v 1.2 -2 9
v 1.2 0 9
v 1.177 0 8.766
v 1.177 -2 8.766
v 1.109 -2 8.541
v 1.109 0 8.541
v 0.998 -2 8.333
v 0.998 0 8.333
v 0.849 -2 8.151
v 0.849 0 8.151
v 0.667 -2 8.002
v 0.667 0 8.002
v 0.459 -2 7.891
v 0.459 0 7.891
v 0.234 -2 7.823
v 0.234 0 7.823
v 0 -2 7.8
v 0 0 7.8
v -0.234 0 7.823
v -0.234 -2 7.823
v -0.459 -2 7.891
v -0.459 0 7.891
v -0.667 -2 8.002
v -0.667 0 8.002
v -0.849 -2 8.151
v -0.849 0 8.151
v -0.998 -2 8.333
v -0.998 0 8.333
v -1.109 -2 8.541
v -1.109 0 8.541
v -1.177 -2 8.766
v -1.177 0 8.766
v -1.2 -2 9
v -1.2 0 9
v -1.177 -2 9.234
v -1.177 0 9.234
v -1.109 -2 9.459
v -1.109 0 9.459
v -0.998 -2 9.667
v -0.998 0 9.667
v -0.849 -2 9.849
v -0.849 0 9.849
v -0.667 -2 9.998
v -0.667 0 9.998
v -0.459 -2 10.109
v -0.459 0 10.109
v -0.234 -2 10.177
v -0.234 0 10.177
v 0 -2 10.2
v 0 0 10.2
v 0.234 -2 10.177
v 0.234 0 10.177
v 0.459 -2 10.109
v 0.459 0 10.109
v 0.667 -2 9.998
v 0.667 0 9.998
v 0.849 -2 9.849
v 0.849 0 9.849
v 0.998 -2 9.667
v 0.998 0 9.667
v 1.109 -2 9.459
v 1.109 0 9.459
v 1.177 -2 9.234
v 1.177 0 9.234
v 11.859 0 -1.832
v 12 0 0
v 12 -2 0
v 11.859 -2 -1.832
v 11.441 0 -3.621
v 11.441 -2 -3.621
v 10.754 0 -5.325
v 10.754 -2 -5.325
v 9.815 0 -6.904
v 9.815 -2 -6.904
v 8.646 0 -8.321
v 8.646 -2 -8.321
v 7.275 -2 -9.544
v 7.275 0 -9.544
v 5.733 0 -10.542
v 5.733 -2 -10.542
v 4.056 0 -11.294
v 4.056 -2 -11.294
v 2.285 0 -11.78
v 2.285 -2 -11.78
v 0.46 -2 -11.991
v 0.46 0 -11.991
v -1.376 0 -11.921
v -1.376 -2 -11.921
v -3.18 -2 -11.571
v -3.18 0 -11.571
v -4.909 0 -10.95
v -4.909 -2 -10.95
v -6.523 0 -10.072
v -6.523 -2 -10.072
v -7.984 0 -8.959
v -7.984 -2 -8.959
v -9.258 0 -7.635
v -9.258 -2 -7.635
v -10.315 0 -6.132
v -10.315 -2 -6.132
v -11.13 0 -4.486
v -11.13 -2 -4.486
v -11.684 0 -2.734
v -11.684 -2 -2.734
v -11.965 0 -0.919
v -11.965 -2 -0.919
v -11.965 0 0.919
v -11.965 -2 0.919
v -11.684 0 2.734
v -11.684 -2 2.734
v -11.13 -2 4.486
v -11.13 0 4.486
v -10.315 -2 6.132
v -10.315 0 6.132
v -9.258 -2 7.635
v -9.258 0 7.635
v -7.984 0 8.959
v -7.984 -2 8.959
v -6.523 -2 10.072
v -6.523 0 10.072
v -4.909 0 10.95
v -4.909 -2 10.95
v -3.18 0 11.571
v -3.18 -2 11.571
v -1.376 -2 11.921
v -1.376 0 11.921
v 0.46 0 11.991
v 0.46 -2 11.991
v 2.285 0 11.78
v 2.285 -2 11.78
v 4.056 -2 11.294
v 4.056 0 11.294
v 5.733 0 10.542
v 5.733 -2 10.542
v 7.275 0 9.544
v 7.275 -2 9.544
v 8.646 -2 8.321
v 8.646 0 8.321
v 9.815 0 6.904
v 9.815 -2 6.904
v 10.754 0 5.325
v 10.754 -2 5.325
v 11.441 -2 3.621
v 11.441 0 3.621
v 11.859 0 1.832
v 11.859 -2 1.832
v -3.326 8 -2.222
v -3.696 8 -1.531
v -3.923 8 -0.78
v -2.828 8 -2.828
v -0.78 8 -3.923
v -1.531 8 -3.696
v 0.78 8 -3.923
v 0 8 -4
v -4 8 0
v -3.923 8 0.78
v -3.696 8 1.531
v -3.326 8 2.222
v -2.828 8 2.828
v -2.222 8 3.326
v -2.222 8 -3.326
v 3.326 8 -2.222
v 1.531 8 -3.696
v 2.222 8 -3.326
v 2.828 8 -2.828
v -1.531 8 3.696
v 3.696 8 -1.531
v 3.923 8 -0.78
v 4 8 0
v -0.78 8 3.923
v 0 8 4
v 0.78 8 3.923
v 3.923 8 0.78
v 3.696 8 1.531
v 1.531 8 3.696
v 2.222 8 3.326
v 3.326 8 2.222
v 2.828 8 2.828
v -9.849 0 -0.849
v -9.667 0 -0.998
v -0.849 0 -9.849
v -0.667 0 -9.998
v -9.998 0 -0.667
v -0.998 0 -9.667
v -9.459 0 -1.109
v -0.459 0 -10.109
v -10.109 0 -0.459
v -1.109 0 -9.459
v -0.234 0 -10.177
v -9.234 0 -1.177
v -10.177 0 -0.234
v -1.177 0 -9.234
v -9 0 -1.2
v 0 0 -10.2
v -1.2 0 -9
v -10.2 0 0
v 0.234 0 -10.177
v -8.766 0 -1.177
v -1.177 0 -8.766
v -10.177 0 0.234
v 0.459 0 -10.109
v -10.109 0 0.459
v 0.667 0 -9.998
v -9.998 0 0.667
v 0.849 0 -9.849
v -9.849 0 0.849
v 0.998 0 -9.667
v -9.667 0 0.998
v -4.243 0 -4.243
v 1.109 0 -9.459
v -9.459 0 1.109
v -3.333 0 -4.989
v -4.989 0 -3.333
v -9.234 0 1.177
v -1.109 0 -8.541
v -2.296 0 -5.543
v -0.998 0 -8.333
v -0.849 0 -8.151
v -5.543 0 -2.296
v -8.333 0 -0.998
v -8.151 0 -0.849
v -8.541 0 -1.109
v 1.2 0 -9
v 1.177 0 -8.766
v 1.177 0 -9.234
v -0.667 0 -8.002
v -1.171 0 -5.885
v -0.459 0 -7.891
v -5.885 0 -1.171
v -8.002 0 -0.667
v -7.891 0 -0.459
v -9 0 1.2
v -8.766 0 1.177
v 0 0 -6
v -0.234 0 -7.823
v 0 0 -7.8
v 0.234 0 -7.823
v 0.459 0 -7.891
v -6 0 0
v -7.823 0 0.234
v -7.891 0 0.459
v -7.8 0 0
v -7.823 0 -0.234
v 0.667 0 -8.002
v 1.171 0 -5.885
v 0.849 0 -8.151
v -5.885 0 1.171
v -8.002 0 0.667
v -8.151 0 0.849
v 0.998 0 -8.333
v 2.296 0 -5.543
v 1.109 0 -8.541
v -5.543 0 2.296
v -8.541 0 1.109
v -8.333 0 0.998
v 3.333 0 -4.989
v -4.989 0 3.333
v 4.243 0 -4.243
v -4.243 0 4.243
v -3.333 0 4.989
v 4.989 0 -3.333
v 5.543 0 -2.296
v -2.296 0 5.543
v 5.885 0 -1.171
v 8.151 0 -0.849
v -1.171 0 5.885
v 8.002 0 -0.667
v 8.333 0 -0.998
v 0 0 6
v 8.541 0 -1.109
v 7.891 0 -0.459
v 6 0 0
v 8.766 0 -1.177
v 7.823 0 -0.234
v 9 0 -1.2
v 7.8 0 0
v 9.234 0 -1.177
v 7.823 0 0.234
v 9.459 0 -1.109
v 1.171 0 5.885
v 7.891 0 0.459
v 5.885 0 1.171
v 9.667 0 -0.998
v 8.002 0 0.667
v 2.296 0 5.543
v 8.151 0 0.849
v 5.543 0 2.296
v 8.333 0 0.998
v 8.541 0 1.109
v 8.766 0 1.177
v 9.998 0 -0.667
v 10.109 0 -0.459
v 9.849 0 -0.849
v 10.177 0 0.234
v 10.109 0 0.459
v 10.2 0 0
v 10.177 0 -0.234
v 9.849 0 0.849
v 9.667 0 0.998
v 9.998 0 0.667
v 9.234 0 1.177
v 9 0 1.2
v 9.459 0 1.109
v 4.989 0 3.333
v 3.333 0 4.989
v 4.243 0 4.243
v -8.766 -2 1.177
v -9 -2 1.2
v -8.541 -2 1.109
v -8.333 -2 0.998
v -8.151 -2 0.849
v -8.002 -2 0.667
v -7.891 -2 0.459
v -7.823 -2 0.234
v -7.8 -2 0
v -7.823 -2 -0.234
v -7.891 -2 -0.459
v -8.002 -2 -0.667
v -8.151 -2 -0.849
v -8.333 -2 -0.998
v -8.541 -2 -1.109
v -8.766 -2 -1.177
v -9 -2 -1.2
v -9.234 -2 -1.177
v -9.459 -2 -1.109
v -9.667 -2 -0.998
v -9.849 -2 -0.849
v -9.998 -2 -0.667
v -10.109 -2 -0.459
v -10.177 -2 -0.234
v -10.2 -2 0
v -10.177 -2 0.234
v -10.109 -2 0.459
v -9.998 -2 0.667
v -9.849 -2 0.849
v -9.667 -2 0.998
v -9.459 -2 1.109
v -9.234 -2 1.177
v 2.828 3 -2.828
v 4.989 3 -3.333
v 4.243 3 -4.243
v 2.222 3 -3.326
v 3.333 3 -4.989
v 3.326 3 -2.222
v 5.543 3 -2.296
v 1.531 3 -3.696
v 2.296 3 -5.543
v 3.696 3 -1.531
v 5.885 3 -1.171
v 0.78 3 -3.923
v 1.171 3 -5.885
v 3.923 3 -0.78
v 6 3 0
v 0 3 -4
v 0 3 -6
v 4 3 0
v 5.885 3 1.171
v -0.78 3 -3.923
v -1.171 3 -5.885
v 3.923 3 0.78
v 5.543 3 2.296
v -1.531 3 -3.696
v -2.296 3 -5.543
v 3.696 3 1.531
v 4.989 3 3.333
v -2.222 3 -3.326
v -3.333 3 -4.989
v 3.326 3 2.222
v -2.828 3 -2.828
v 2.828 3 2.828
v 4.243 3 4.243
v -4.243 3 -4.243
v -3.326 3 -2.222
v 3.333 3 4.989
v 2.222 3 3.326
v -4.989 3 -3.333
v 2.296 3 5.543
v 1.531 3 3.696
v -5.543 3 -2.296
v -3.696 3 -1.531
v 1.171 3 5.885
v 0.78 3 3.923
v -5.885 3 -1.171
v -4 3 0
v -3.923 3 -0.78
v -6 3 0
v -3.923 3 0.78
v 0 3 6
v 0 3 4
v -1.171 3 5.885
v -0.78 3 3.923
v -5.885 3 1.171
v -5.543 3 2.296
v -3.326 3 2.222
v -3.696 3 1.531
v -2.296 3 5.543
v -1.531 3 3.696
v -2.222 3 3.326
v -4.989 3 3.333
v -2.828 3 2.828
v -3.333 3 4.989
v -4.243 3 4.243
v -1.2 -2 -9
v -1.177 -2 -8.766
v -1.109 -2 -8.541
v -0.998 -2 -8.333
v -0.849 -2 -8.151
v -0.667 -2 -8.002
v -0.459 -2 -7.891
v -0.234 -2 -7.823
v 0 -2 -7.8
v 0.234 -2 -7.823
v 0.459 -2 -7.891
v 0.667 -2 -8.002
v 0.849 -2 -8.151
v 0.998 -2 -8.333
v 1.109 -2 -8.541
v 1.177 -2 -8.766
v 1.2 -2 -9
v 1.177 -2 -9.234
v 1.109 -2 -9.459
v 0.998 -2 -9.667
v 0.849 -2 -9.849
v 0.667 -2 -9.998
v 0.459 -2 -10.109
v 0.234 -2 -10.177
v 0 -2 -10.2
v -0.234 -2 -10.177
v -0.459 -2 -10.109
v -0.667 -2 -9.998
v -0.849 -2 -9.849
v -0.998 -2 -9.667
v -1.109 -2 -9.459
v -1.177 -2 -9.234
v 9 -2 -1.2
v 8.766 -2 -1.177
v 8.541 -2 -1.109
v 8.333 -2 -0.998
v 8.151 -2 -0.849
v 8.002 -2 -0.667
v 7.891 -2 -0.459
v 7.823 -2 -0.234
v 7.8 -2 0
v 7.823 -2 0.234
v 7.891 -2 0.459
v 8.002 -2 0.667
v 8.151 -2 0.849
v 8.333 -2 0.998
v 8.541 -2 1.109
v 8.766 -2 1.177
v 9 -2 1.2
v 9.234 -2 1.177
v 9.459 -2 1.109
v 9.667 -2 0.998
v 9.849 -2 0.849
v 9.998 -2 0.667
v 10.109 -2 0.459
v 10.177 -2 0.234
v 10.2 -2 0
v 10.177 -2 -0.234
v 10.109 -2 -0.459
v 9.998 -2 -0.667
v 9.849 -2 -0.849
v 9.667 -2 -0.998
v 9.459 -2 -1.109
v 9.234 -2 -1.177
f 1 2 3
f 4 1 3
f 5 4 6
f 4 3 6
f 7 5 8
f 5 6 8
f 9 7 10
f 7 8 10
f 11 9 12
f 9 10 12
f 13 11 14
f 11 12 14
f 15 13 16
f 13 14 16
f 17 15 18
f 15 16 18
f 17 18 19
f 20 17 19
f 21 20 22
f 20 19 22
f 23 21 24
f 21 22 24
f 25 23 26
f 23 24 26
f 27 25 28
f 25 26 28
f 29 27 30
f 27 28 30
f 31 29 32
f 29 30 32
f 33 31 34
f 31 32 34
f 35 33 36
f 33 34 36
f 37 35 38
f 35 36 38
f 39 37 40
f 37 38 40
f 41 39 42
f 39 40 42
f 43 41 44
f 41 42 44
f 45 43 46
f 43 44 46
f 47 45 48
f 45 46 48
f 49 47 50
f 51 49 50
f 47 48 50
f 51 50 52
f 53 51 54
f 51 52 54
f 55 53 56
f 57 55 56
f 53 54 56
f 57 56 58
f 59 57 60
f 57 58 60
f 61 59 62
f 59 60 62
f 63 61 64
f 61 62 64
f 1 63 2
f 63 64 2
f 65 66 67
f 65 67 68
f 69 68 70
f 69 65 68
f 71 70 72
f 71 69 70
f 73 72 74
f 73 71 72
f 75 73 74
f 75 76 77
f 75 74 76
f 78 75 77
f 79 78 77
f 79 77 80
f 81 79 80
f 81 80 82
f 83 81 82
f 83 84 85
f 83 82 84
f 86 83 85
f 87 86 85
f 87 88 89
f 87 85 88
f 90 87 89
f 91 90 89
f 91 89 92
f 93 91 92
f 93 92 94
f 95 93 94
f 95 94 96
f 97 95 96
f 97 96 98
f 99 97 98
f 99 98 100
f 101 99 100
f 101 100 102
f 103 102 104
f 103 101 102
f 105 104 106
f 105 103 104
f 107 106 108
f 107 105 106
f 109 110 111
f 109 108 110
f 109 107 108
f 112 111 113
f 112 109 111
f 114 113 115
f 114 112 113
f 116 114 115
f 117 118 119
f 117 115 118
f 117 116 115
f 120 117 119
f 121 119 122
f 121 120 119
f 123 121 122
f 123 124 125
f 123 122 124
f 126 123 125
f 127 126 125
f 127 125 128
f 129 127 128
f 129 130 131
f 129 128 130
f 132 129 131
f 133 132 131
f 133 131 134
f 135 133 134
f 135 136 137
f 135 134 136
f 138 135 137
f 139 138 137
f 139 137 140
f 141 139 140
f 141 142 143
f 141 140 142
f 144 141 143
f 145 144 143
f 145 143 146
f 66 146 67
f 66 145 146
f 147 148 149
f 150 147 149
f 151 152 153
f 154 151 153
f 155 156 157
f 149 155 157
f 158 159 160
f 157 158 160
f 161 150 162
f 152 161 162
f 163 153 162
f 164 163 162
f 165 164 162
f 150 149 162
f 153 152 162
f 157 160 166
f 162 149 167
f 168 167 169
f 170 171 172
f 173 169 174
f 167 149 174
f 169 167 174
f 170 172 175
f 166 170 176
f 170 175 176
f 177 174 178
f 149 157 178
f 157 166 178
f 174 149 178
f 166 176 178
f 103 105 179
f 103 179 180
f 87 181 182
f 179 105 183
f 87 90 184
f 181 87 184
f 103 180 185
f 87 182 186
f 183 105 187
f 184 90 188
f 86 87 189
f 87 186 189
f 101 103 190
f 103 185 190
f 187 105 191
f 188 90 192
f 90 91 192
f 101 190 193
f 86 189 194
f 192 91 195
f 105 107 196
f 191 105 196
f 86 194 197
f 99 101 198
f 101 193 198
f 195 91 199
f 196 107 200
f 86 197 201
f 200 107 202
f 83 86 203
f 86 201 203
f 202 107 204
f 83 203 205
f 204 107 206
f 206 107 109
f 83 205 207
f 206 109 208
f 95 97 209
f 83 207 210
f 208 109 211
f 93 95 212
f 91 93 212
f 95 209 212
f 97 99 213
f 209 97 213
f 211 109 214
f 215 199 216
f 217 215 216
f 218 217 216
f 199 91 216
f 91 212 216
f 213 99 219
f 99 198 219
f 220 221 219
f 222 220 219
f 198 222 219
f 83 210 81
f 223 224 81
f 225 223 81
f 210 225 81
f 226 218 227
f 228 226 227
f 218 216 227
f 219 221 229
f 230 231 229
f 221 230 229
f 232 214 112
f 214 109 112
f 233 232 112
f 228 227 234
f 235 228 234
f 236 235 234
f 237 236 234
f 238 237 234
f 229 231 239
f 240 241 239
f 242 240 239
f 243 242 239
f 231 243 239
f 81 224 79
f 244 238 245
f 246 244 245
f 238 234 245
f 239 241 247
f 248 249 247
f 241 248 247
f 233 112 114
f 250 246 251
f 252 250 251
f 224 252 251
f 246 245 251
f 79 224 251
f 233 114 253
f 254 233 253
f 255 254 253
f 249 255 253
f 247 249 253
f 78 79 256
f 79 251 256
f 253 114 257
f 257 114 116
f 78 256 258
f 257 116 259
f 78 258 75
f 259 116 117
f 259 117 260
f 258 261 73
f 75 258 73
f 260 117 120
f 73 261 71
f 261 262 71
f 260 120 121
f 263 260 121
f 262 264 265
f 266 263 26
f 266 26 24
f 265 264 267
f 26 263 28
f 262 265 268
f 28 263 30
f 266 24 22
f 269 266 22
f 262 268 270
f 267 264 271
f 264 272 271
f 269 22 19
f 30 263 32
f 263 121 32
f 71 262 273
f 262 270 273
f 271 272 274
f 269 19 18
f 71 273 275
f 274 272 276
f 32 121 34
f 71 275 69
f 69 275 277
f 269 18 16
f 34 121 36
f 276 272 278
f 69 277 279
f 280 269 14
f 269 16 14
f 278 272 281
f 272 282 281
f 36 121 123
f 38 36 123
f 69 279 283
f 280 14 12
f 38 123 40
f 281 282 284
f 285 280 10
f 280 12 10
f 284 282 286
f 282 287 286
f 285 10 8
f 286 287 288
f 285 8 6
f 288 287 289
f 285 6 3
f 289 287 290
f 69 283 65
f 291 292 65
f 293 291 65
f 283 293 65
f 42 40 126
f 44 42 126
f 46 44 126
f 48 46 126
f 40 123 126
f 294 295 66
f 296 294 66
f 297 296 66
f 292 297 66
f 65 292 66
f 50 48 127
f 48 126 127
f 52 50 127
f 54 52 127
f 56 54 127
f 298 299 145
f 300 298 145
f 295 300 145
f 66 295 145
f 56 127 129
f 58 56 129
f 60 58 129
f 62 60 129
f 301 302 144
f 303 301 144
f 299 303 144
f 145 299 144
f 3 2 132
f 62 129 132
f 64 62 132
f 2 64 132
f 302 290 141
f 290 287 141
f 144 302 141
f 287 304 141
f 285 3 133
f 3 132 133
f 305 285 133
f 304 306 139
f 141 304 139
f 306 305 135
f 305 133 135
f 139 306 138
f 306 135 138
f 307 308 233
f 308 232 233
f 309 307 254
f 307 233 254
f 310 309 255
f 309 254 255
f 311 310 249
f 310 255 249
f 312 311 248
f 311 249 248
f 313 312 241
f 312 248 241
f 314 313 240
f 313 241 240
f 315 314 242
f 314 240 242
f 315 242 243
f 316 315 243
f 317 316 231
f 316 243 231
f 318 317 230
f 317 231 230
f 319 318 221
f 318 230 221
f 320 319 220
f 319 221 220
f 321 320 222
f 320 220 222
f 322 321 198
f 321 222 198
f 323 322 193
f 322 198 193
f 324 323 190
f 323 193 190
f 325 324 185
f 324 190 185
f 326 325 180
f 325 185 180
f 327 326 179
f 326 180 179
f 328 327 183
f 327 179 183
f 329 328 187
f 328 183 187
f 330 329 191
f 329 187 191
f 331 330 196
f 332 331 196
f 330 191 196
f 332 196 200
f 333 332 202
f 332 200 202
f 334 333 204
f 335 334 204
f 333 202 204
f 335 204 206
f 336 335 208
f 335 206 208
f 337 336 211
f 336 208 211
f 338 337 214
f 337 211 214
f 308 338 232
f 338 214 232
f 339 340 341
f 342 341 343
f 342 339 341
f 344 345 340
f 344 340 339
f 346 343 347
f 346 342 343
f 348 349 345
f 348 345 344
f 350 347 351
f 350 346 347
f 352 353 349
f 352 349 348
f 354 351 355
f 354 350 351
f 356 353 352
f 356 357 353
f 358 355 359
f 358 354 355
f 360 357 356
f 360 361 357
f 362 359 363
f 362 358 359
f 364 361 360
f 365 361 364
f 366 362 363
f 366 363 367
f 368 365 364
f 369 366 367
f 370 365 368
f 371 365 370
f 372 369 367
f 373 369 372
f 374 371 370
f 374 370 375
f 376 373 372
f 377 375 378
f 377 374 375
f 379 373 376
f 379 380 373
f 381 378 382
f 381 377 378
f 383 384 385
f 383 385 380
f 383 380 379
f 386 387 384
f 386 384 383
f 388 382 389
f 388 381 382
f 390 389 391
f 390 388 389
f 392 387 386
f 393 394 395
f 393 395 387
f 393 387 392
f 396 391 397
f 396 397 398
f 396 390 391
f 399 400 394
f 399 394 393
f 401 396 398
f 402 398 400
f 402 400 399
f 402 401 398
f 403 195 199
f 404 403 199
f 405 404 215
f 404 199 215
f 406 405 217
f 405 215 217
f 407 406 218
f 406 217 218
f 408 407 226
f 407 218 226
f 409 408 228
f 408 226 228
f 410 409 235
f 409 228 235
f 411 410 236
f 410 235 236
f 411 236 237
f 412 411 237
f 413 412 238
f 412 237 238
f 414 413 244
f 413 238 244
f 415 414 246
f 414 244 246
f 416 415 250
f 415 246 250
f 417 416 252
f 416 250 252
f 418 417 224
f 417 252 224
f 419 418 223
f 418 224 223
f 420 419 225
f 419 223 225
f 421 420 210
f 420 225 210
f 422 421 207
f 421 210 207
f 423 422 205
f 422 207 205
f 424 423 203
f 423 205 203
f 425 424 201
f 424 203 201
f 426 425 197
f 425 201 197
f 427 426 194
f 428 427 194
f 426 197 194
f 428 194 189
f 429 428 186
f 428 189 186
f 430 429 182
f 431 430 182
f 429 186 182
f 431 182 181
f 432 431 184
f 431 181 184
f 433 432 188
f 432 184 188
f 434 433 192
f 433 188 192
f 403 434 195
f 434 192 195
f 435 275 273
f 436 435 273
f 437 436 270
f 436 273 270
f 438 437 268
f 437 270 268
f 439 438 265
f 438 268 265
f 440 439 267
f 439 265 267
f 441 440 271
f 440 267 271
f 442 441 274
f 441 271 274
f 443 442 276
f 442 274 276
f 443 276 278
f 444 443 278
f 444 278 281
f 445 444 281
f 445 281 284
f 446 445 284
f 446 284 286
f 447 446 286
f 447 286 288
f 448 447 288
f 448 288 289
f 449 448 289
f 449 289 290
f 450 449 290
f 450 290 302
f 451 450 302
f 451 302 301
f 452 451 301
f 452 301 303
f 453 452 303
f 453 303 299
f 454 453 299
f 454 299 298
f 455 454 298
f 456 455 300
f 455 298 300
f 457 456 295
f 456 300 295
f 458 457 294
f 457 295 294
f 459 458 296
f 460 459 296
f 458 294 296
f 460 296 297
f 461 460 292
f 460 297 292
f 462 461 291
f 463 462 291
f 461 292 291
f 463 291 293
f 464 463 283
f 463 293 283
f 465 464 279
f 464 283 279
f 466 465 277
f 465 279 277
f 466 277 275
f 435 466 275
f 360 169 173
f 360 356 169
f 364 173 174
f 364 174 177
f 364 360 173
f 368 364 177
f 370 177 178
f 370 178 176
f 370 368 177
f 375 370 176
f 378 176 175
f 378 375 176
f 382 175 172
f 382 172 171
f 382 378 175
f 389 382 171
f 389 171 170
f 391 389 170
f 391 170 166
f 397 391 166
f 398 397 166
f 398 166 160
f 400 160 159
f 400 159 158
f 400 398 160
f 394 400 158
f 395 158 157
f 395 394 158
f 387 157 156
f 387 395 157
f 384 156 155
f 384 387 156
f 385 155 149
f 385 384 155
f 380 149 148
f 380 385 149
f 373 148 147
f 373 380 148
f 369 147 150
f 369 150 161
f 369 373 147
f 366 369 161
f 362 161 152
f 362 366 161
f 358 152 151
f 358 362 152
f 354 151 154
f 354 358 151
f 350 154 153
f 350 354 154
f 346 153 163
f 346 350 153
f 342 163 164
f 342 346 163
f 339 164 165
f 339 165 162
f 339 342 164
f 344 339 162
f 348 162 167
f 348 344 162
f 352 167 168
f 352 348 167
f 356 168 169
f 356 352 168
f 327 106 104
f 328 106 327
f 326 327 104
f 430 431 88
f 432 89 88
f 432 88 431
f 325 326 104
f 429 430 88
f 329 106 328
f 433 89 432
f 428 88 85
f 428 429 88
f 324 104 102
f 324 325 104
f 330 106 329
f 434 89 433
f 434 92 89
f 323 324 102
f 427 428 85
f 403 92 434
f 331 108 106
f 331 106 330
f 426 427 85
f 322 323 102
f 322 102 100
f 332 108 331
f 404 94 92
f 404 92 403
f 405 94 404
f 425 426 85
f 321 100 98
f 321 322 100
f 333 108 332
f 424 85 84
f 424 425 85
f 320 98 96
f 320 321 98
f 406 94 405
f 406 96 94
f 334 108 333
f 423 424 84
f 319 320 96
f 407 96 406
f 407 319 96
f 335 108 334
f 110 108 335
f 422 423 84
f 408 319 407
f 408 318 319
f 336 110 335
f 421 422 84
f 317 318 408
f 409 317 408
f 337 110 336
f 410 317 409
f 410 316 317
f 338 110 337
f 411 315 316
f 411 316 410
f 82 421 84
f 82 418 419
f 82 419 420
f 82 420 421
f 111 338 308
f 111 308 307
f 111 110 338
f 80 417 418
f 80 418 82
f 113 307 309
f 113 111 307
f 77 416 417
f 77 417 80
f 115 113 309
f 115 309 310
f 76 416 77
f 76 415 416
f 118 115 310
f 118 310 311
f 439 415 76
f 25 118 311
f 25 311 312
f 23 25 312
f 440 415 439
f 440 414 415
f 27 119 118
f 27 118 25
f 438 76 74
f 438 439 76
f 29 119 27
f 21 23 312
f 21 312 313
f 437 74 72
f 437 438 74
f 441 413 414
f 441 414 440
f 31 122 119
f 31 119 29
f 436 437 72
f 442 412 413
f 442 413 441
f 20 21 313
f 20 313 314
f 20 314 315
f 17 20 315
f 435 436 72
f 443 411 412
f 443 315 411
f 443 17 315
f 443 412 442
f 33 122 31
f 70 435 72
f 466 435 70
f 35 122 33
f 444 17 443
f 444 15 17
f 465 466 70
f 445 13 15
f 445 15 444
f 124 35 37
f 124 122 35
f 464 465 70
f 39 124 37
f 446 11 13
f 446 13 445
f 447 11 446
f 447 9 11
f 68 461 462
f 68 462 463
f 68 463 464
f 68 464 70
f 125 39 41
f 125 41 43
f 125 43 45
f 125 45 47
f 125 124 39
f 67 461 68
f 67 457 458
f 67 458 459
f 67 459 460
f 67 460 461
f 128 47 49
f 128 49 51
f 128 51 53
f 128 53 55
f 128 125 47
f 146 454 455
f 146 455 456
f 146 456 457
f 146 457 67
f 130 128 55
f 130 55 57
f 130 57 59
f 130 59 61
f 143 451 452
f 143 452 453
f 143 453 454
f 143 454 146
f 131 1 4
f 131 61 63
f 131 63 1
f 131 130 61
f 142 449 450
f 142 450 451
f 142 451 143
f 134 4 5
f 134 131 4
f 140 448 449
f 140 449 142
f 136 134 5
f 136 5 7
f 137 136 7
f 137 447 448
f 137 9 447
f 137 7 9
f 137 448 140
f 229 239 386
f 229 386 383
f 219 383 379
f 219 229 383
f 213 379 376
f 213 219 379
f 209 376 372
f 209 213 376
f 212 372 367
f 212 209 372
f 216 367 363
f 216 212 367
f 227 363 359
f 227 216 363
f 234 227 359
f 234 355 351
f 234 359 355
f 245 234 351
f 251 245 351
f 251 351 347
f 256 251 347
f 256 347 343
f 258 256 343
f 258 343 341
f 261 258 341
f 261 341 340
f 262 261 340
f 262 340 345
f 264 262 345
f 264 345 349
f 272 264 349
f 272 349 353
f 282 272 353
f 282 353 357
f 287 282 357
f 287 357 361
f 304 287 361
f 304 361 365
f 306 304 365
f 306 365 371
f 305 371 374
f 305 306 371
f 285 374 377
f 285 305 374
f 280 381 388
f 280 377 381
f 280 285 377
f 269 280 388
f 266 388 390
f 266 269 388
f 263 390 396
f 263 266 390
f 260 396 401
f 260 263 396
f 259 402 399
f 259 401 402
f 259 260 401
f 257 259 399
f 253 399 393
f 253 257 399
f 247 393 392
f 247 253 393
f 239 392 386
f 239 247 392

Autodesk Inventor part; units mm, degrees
ref_plane "YZ Plane" through (0, 0, 0) normal (1, 0, 0) x (0, 1, 0)
ref_plane "XZ Plane" through (0, 0, 0) normal (0, 1, 0) x (-1, 0, 0)
ref_plane "XY Plane" through (0, 0, 0) normal (0, 0, 1) x (1, 0, 0)
sketch "Skizze1" plane through (0, 0, 0) normal (0, 1, 0) x (-1, 0, 0)
  circle A0 centre (0, 0) radius 6
  dimension "d0" = 12
extrude "Extrusion1" add sketch "Skizze1" along normal blind 3
sketch "Skizze2" plane through (0, 0, 0) normal (0, -1, 0) x (1, 0, 0)
  circle A0 centre (0, 0) radius 4
  dimension "d3" = 8
extrude "Extrusion2" add sketch "Skizze2" against normal blind 8
sketch "Skizze3" plane through (0, 0, 0) normal (0, -1, 0) x (1, 0, 0)
  circle A0 centre (0, 0) radius 12
  dimension "d6" = 24
extrude "Extrusion3" add sketch "Skizze3" along normal blind 2
sketch "Skizze4" plane through (0, -2, 0) normal (0, -1, 0) x (1, 0, 0)
  point P0 (0, 0)
  point P1 (9, 0)
  dimension "d9" = 9
hole "Bohrung1" at (9, -2, 0) direction (0, 1, 0) diameter 2.4 end through all clearance for "Inbusschraube ISO 4762" size "M2" standard "ISO"
pattern_circular "Runde Anordnung1" count 4 over 360 about axis through (0, 0, 0) along (0, -1, 0) of "Bohrung1"
properties part number "dynamixel_pro_frame_shaft"
